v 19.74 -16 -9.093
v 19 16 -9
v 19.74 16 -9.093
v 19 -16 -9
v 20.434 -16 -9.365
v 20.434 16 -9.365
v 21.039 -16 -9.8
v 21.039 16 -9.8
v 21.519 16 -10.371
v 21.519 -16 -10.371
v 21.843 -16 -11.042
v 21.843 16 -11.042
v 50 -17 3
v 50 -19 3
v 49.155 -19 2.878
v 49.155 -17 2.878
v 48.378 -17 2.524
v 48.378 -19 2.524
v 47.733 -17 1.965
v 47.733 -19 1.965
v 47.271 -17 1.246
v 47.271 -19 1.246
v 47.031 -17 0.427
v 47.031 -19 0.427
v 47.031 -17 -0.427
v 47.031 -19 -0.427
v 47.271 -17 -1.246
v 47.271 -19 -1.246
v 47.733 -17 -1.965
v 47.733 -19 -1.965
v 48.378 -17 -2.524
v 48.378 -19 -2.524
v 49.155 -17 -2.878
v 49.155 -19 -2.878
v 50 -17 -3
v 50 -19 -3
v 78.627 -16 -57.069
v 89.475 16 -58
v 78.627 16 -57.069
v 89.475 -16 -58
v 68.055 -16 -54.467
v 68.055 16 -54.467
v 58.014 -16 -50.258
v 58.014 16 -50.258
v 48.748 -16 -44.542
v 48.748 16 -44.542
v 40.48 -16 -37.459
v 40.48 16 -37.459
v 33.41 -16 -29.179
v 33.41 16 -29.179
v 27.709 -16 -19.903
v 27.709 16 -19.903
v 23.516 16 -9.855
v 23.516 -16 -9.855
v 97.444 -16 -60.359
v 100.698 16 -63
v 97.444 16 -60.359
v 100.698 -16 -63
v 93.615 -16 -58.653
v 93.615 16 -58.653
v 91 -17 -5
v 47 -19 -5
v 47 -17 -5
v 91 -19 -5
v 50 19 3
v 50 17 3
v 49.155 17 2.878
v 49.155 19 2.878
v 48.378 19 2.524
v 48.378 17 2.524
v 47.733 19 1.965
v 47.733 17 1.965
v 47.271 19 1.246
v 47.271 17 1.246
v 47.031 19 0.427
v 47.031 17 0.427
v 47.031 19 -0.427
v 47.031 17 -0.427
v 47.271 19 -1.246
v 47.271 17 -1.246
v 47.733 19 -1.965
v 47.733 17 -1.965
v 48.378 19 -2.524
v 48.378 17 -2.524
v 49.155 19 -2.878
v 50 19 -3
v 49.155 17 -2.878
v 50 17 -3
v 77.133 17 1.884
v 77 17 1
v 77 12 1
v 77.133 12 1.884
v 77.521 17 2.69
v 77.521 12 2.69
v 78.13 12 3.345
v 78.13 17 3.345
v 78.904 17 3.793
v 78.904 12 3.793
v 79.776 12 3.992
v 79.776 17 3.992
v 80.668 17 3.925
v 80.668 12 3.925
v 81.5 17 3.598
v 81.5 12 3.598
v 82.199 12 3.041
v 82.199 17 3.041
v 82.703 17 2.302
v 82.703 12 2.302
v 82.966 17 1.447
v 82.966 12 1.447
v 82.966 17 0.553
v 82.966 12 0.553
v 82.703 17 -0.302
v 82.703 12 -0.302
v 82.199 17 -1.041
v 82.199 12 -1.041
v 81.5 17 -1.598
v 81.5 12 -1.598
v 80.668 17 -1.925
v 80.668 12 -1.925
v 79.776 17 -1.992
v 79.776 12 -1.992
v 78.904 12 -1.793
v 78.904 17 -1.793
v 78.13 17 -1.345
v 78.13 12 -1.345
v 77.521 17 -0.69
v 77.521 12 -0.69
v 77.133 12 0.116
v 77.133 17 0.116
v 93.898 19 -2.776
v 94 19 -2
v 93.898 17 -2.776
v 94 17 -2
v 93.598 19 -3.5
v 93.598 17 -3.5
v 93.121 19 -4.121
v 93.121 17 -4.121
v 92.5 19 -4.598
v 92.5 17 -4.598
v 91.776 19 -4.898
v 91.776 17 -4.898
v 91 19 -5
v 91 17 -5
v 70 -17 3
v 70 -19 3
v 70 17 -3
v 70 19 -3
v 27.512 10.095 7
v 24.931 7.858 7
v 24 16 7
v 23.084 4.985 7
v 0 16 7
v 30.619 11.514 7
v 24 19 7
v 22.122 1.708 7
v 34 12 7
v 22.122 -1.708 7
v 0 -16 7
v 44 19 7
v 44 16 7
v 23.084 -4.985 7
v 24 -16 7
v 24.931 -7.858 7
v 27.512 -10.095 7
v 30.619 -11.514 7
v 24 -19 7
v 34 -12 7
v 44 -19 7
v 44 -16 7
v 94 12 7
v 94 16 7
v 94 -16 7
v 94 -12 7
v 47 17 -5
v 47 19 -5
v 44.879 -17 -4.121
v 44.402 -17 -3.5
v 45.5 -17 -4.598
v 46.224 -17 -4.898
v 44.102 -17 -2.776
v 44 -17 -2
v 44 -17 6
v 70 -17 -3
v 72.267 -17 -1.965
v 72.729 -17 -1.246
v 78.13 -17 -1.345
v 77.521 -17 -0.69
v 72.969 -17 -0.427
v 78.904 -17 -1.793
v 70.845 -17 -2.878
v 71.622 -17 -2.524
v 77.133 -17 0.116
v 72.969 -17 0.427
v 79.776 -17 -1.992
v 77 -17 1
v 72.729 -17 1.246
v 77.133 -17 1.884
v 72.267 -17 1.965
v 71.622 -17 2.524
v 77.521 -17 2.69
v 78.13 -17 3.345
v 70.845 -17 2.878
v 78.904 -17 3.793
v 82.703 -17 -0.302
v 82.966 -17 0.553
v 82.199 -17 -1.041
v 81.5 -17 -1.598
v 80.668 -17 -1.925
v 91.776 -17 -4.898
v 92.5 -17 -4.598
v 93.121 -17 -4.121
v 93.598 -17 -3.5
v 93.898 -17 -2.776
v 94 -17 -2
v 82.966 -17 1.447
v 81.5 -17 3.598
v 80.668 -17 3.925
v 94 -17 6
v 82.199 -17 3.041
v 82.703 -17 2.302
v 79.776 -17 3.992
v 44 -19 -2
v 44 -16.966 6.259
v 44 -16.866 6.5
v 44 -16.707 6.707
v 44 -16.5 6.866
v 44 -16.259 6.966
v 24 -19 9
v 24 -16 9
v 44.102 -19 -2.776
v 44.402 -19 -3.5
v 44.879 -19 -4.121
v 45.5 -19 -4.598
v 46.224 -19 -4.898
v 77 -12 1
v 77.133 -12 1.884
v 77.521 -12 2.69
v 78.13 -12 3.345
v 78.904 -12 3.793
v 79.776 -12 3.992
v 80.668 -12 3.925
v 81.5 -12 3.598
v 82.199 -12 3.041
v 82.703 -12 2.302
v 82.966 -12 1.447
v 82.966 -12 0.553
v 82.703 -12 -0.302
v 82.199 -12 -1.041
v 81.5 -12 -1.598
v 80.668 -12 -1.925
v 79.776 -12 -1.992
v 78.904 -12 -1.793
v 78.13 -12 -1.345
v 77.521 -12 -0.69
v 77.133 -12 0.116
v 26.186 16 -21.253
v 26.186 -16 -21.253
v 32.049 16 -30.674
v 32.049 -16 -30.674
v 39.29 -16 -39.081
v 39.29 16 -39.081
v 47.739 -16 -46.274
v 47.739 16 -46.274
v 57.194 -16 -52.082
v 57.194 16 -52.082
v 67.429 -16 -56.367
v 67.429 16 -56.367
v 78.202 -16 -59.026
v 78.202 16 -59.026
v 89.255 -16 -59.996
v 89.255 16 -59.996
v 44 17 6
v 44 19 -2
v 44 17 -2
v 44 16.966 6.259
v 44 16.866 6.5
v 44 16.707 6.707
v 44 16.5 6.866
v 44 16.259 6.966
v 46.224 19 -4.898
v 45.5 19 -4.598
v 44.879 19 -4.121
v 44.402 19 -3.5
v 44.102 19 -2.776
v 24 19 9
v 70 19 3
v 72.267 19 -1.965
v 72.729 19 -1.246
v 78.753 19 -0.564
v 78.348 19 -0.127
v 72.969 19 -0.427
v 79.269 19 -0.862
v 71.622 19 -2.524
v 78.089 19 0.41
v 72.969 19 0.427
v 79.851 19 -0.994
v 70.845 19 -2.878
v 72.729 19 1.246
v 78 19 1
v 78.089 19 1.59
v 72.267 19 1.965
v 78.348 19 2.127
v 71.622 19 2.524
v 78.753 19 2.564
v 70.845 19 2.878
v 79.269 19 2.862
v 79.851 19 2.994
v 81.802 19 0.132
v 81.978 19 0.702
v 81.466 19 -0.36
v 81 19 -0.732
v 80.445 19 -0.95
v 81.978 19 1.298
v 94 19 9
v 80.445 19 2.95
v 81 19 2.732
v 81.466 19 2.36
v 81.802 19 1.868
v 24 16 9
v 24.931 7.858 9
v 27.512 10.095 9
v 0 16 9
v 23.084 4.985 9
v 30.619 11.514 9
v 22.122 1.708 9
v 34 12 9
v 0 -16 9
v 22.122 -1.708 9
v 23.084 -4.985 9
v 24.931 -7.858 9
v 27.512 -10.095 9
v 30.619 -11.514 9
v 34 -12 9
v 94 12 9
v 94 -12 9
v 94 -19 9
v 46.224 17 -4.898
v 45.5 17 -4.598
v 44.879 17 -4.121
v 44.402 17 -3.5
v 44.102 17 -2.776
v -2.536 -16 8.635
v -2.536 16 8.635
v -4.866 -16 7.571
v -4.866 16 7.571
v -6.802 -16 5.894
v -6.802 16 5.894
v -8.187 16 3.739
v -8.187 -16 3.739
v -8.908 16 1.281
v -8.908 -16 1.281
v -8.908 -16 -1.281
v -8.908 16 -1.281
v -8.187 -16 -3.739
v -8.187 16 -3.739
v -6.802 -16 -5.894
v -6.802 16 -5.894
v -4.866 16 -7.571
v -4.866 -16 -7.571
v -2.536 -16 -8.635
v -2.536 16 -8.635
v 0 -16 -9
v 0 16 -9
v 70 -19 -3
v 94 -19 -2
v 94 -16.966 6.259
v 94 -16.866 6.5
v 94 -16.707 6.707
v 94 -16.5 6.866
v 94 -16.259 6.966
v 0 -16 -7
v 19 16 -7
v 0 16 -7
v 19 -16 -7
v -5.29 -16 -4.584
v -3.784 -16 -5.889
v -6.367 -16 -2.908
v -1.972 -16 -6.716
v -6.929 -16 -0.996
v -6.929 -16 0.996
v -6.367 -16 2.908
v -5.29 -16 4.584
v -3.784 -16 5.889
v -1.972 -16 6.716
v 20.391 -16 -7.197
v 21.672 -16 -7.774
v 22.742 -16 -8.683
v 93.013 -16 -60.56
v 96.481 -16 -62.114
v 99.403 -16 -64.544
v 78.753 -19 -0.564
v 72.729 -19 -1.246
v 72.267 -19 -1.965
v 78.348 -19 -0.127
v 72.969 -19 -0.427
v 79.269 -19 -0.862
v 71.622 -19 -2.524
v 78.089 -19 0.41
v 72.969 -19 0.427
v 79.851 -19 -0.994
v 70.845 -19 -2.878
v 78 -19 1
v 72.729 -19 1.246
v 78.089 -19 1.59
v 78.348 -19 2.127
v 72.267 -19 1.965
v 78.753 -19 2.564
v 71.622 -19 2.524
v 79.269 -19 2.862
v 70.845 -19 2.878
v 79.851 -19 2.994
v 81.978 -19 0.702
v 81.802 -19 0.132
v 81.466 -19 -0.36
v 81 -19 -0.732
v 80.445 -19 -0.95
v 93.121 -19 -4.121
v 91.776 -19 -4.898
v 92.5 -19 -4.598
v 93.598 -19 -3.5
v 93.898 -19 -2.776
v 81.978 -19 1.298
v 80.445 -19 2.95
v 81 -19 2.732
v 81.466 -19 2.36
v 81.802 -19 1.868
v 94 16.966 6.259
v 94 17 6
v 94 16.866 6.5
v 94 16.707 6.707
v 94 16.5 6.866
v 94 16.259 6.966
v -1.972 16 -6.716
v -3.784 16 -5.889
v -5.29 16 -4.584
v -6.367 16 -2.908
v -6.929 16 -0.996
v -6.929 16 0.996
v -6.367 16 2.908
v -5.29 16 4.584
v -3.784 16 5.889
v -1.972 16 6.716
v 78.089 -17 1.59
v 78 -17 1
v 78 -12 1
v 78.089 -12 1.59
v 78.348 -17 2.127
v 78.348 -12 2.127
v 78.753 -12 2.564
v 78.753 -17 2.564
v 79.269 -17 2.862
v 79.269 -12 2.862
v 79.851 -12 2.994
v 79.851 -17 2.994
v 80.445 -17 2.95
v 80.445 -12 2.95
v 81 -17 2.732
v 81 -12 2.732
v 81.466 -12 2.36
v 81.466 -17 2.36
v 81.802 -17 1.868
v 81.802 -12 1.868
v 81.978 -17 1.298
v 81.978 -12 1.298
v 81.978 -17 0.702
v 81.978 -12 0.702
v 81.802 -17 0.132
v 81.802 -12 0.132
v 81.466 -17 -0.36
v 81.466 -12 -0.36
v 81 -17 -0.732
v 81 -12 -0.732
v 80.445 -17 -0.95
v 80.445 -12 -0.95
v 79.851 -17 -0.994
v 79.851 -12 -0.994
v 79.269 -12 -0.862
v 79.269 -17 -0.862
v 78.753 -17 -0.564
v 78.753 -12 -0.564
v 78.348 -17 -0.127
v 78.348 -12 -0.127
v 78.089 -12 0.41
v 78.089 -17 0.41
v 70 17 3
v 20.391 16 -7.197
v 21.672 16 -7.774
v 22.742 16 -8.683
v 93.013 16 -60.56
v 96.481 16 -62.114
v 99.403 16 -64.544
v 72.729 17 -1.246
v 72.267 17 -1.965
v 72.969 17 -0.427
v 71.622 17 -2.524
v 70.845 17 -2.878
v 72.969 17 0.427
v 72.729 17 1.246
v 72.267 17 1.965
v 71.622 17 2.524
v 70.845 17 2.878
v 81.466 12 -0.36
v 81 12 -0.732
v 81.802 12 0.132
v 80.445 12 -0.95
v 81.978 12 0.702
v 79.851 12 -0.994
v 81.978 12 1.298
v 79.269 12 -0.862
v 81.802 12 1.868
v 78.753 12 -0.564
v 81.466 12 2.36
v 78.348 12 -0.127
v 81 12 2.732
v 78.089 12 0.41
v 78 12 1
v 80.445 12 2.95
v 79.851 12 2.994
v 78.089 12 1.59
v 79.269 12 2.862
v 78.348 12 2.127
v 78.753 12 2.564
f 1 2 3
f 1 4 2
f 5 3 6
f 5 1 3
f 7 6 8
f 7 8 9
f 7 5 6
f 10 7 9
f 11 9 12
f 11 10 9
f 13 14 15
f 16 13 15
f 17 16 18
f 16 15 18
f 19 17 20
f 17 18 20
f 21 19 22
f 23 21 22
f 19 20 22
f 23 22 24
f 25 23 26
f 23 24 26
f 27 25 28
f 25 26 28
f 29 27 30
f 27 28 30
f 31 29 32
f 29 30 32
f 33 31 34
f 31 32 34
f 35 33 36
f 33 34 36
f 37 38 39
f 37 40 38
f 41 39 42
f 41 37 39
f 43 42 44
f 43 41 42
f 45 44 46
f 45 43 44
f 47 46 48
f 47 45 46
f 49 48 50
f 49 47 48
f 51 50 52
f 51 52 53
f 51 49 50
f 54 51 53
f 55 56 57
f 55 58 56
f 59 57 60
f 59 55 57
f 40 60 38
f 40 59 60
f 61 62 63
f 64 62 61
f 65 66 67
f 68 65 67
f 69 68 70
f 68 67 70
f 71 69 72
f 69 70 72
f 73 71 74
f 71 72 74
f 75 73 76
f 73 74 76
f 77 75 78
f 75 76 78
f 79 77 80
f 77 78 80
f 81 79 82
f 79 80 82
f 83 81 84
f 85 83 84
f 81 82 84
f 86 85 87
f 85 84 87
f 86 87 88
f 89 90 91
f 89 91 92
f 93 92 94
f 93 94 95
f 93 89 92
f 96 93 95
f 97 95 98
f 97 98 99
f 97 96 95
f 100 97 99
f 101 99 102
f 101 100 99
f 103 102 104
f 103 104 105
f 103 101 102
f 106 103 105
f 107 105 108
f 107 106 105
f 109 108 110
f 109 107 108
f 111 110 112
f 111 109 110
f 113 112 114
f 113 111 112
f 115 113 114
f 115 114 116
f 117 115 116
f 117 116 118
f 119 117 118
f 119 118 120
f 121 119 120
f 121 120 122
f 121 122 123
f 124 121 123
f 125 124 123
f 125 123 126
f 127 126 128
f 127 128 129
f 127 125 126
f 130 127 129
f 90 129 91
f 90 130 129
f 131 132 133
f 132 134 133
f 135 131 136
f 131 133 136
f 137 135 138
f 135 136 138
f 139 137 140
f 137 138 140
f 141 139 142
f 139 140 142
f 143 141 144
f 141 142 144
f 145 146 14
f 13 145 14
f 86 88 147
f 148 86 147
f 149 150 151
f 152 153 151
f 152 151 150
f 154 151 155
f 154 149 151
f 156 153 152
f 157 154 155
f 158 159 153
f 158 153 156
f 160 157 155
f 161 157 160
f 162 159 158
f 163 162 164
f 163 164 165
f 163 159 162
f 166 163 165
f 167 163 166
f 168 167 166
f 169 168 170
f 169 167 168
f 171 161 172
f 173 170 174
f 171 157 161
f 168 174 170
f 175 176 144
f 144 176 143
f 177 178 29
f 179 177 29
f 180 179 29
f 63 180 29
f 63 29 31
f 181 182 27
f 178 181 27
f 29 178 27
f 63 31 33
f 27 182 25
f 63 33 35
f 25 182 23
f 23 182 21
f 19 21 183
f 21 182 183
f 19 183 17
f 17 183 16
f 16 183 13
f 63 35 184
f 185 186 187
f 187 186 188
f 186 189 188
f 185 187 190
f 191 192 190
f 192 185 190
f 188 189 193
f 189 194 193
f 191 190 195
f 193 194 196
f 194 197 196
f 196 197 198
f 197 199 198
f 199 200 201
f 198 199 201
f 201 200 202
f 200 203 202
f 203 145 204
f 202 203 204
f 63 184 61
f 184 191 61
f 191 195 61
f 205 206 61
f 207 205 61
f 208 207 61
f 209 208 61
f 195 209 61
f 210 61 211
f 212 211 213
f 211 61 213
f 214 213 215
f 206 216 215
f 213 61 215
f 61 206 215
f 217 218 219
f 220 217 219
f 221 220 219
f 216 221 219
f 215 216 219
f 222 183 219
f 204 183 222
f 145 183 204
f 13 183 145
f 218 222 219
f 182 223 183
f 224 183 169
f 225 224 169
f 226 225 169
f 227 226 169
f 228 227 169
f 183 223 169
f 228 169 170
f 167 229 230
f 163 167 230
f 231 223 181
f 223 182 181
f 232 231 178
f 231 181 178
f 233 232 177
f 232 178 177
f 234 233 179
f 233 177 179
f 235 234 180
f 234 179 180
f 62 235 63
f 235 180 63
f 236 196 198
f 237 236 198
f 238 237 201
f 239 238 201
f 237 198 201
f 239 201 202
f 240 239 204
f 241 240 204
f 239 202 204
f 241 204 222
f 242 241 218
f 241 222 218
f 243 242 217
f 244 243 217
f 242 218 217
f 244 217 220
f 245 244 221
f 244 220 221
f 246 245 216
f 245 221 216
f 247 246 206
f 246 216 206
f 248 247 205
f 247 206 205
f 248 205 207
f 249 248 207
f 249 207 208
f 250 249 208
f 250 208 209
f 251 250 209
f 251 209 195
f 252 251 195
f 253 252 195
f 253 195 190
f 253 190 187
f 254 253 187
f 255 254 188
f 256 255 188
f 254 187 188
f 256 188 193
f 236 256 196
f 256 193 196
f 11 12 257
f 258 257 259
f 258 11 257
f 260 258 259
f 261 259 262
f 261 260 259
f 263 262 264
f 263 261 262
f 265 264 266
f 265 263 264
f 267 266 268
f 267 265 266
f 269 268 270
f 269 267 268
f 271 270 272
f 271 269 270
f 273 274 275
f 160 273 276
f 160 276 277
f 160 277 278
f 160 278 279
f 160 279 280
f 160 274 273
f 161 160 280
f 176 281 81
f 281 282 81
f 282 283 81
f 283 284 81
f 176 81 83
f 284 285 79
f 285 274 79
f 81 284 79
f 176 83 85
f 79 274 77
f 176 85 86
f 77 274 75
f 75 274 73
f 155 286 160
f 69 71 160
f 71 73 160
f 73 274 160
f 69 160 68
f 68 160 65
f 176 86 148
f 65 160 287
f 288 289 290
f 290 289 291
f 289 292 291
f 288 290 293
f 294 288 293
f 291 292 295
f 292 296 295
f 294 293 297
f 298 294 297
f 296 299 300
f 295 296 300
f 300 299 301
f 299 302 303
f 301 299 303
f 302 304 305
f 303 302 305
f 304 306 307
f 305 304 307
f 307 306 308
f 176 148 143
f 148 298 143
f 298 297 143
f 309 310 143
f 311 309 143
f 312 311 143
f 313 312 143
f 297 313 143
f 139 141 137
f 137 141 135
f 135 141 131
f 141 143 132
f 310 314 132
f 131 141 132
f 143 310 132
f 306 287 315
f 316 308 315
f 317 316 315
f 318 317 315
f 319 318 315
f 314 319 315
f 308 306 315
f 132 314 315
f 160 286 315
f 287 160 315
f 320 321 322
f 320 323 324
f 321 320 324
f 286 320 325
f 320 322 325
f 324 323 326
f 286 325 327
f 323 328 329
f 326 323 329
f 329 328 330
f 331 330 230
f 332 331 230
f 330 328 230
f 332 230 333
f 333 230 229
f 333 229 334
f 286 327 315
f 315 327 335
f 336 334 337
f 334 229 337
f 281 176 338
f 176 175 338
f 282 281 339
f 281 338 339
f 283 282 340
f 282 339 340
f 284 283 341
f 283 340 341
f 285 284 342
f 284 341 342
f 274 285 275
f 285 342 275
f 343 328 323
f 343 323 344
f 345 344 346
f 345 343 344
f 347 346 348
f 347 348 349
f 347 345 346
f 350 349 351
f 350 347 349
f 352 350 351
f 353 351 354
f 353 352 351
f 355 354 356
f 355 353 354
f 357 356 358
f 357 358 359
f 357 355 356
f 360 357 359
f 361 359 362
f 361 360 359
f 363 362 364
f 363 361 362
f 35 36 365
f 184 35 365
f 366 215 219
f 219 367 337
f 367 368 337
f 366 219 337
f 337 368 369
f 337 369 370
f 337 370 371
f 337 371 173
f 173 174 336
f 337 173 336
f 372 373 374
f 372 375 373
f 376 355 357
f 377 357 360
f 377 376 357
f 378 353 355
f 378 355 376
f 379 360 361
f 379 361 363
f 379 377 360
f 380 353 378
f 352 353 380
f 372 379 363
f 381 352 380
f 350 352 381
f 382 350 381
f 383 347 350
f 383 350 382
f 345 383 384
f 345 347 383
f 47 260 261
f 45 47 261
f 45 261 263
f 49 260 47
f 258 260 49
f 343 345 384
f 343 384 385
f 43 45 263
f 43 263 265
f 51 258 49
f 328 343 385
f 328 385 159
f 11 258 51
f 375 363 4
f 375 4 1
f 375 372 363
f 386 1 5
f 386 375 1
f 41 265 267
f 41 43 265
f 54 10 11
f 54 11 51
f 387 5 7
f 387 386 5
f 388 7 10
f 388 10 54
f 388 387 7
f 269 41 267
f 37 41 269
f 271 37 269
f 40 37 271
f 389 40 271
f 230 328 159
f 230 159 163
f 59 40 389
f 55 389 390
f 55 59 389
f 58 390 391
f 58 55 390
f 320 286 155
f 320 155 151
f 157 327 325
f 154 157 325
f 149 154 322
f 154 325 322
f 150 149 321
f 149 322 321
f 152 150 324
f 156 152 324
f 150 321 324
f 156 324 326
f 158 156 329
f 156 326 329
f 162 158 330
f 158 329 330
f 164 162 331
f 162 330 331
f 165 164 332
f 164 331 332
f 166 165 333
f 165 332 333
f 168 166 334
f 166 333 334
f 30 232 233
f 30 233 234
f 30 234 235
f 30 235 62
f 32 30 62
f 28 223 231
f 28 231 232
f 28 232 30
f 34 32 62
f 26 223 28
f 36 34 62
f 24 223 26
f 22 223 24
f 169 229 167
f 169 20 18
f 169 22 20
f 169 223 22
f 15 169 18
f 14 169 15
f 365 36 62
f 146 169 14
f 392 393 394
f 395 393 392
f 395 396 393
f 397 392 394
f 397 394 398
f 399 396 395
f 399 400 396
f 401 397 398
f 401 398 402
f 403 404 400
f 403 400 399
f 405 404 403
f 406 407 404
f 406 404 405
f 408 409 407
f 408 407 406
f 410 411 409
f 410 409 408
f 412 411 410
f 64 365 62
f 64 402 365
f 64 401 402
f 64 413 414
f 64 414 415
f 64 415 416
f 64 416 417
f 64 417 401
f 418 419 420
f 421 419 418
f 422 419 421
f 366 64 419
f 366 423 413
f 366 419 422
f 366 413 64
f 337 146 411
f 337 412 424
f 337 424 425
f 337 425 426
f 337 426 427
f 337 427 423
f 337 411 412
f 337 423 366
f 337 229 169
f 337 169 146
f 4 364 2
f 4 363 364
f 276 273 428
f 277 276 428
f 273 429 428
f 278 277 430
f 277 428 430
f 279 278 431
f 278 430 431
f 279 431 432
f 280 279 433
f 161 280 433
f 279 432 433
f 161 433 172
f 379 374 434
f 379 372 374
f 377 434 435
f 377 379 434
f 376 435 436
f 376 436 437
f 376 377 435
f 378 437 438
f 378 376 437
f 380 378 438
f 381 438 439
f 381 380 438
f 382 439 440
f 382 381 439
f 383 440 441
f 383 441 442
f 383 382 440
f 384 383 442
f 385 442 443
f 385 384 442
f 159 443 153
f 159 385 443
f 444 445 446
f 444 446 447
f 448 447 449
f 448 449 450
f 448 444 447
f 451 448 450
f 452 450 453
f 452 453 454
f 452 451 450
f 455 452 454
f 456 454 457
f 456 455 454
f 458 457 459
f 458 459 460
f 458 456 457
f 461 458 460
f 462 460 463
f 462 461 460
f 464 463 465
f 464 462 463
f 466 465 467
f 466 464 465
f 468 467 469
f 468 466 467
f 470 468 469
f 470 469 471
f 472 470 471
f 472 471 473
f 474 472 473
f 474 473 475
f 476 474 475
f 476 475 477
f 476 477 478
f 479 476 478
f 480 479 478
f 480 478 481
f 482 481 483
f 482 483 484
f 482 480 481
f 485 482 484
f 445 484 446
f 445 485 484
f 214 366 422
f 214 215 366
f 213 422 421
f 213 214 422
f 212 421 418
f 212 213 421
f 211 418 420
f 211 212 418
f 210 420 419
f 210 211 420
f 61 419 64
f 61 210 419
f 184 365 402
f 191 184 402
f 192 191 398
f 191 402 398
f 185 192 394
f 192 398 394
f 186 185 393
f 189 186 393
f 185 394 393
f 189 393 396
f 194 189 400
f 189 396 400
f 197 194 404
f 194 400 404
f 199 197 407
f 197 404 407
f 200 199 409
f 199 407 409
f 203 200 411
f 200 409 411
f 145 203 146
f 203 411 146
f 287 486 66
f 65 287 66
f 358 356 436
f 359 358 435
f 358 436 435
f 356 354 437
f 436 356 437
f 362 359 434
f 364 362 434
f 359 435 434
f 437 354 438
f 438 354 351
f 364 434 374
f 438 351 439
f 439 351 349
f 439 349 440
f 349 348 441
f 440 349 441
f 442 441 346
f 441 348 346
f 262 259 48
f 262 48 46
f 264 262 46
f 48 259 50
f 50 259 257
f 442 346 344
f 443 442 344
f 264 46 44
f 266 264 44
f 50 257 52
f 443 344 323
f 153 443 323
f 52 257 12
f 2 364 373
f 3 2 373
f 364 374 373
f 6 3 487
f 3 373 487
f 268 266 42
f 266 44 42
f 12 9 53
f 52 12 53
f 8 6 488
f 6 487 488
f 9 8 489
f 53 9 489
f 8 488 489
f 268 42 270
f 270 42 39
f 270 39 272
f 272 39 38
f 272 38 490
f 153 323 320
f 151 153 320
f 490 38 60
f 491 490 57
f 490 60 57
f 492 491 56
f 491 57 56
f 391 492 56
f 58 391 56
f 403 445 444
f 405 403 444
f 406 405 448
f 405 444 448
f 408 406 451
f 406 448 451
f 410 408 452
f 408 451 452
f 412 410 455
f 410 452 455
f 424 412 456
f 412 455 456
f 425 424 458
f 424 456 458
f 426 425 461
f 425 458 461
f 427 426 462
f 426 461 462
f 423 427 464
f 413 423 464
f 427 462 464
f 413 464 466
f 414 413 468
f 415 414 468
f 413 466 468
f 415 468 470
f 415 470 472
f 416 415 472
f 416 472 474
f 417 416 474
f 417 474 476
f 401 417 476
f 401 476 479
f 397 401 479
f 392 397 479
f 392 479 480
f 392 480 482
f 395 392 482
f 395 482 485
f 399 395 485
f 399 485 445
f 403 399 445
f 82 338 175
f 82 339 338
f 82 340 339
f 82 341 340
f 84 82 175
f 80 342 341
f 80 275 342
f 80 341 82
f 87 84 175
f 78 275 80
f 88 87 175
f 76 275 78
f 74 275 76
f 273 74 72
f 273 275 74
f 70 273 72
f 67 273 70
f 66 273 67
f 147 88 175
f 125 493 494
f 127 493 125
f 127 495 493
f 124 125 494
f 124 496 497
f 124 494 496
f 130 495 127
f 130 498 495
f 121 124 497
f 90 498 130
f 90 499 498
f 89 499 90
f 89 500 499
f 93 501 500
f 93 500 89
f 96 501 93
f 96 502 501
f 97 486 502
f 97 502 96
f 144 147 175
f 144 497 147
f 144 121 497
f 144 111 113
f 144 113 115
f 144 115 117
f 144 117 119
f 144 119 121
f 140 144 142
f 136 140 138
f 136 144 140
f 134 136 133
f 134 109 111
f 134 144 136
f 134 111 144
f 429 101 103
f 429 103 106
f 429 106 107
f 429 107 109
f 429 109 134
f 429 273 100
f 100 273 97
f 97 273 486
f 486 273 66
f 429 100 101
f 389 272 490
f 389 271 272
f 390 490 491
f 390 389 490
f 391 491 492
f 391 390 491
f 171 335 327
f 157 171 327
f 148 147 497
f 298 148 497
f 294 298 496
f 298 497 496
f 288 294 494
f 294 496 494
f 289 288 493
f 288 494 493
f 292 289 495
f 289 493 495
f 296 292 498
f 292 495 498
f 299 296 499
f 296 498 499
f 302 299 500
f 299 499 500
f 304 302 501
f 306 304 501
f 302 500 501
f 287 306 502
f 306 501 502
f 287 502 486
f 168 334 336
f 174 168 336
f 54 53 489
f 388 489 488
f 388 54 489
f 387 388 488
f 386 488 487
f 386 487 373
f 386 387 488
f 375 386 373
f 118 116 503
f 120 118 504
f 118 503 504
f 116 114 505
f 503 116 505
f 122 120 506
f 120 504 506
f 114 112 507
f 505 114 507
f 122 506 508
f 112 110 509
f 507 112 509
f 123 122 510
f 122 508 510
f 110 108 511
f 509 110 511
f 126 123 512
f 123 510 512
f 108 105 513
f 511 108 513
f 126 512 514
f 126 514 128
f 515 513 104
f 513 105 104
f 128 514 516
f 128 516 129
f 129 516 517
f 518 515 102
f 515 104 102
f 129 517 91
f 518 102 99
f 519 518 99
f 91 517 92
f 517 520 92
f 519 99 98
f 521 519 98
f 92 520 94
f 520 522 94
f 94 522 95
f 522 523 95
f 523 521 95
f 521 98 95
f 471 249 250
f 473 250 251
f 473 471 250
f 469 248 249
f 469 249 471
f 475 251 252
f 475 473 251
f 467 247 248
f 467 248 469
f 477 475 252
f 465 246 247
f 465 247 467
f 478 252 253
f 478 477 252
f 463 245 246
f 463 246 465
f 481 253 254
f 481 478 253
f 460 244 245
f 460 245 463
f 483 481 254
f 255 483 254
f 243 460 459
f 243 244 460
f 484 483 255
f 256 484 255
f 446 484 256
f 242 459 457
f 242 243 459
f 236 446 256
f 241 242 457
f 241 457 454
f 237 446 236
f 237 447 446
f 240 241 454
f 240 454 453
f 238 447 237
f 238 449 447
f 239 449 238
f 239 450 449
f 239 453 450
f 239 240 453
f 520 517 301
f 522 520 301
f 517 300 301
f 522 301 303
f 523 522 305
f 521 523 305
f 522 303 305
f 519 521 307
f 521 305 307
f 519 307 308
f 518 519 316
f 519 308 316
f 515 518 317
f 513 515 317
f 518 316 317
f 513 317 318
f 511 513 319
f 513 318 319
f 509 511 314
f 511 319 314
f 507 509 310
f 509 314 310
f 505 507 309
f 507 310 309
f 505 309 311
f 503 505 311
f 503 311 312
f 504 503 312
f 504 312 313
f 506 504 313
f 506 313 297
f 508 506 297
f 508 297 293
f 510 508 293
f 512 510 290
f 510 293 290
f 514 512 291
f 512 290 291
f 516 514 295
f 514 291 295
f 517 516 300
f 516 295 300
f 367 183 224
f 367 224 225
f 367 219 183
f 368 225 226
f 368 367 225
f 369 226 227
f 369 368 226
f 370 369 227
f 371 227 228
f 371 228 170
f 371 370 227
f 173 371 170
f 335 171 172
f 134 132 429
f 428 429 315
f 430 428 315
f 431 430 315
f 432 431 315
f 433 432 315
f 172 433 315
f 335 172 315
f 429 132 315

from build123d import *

# Parameters (mm, degrees)
F1_DEPTH  = 16
F2_W      = 70
F2_H      = 3
F3_DEPTH  = 2
F4_W      = 50
F4_H      = 14
F5_DEPTH  = 2
F6_R      = 1
F9_DEPTH  = 2
F11_DEPTH = 38.001
F13_D     = 4
F14_R     = 3
F14_R_2   = 2
F15_DEPTH = 5
F16_R     = 3


# Not quite as in the source:
# - a pattern or mirror of a feature is missing from the dataset's text; its kind, count and spacing are read off the source's solid


with BuildPart() as f1:
    # F0 (on Front) → F1 (new body)
    with BuildSketch(Plane.XZ):
        with BuildLine():
            Line((94, 9), (0, 9))
            ThreePointArc((0, 9), (-9, 0), (0, -9))
            Line((0, -9), (19, -9))
            ThreePointArc((19, -9), (20.7502012229, -9.5634459417), (21.8429732618, -11.0421362138))
            ThreePointArc((21.8429732618, -11.0421362138), (47.7390385011, -46.2740019539), (89.2552166837, -59.996155849))
            ThreePointArc((89.2552166837, -59.996155849), (94.7998907394, -61.2192390349), (99.4028141151, -64.5437599417))
            Line((99.4028141151, -64.5437599417), (100.6981825128, -63))
            ThreePointArc((100.6981825128, -63), (95.5856099225, -59.3797463332), (89.4748869571, -58))
            ThreePointArc((89.4748869571, -58), (48.7477072094, -44.5420257674), (23.5164318764, -9.8548093079))
            ThreePointArc((23.5164318764, -9.8548093079), (21.6715207784, -7.7735385095), (19, -7))
            Line((19, -7), (0, -7))
            ThreePointArc((0, -7), (-7, 0), (0, 7))
            Line((0, 7), (94, 7))
            Line((94, 7), (94, 9))
        make_face()
    extrude(amount=F1_DEPTH)

    # F2 (on face) → F3 (join)
    with BuildSketch(Plane.XY.offset(9)):
        with Locations((59, -17.5)):
            Rectangle(F2_W, F2_H)
    extrude(amount=-F3_DEPTH)

    # F4 (on face) → F5 (join)
    with BuildSketch(Plane.XZ.offset(19)):
        with Locations((69, 2)):
            Rectangle(F4_W, F4_H)
    extrude(amount=-F5_DEPTH)

    # F6
    f6_edges = [f1.edges().sort_by_distance(p)[0] for p in [
        (69, -17, 7),
    ]]
    fillet(f6_edges, radius=F6_R)

    # F7: F1 across plane


with BuildPart() as f1_1:
    add(f1.part)
    add(f1.part.mirror(Plane.XZ))

    # F8 (on face) → F9 (cut)
    with BuildSketch(Plane.XY.offset(9)):
        with BuildLine():
            Line((94, 12), (34, 12))
            ThreePointArc((34, 12), (22, 0), (34, -12))
            Line((34, -12), (94, -12))
            Line((94, -12), (94, 12))
        make_face()
    extrude(amount=-F9_DEPTH, mode=Mode.SUBTRACT)

    # F10 (on face) → F11 (cut, through all)
    with BuildSketch(Plane.XZ.offset(19)):
        with BuildLine():
            ThreePointArc((50, 3), (47, 0), (50, -3))
            Line((50, -3), (70, -3))
            ThreePointArc((70, -3), (73, 0), (70, 3))
            Line((70, 3), (50, 3))
        make_face()
    extrude(amount=-F11_DEPTH, mode=Mode.SUBTRACT)

    # F13 (through all)
    with Locations(Plane.XZ.offset(19)):
        with Locations((80, 1)):
            Hole(F13_D / 2)

    # F14 (on face) → F15 (join)
    with BuildSketch(Plane(origin=(0, -17, 0), x_dir=(-1, 0, 0), z_dir=(0, 1, 0))):
        with Locations((-80, 1)):
            Circle(F14_R)
        with Locations((-80, 1)):
            Circle(F14_R_2, mode=Mode.SUBTRACT)
    f15 = extrude(amount=F15_DEPTH)

    # F15_copies: F15 across plane
    add(f15.mirror(Plane.ZX))

    # F16
    f16_edges = [f1_1.edges().sort_by_distance(p)[0] for p in [
        (94, -18, -5),
        (44, -18, -5),
        (94, 18, -5),
        (44, 18, -5),
    ]]
    fillet(f16_edges, radius=F16_R)


solid = f1_1.part
